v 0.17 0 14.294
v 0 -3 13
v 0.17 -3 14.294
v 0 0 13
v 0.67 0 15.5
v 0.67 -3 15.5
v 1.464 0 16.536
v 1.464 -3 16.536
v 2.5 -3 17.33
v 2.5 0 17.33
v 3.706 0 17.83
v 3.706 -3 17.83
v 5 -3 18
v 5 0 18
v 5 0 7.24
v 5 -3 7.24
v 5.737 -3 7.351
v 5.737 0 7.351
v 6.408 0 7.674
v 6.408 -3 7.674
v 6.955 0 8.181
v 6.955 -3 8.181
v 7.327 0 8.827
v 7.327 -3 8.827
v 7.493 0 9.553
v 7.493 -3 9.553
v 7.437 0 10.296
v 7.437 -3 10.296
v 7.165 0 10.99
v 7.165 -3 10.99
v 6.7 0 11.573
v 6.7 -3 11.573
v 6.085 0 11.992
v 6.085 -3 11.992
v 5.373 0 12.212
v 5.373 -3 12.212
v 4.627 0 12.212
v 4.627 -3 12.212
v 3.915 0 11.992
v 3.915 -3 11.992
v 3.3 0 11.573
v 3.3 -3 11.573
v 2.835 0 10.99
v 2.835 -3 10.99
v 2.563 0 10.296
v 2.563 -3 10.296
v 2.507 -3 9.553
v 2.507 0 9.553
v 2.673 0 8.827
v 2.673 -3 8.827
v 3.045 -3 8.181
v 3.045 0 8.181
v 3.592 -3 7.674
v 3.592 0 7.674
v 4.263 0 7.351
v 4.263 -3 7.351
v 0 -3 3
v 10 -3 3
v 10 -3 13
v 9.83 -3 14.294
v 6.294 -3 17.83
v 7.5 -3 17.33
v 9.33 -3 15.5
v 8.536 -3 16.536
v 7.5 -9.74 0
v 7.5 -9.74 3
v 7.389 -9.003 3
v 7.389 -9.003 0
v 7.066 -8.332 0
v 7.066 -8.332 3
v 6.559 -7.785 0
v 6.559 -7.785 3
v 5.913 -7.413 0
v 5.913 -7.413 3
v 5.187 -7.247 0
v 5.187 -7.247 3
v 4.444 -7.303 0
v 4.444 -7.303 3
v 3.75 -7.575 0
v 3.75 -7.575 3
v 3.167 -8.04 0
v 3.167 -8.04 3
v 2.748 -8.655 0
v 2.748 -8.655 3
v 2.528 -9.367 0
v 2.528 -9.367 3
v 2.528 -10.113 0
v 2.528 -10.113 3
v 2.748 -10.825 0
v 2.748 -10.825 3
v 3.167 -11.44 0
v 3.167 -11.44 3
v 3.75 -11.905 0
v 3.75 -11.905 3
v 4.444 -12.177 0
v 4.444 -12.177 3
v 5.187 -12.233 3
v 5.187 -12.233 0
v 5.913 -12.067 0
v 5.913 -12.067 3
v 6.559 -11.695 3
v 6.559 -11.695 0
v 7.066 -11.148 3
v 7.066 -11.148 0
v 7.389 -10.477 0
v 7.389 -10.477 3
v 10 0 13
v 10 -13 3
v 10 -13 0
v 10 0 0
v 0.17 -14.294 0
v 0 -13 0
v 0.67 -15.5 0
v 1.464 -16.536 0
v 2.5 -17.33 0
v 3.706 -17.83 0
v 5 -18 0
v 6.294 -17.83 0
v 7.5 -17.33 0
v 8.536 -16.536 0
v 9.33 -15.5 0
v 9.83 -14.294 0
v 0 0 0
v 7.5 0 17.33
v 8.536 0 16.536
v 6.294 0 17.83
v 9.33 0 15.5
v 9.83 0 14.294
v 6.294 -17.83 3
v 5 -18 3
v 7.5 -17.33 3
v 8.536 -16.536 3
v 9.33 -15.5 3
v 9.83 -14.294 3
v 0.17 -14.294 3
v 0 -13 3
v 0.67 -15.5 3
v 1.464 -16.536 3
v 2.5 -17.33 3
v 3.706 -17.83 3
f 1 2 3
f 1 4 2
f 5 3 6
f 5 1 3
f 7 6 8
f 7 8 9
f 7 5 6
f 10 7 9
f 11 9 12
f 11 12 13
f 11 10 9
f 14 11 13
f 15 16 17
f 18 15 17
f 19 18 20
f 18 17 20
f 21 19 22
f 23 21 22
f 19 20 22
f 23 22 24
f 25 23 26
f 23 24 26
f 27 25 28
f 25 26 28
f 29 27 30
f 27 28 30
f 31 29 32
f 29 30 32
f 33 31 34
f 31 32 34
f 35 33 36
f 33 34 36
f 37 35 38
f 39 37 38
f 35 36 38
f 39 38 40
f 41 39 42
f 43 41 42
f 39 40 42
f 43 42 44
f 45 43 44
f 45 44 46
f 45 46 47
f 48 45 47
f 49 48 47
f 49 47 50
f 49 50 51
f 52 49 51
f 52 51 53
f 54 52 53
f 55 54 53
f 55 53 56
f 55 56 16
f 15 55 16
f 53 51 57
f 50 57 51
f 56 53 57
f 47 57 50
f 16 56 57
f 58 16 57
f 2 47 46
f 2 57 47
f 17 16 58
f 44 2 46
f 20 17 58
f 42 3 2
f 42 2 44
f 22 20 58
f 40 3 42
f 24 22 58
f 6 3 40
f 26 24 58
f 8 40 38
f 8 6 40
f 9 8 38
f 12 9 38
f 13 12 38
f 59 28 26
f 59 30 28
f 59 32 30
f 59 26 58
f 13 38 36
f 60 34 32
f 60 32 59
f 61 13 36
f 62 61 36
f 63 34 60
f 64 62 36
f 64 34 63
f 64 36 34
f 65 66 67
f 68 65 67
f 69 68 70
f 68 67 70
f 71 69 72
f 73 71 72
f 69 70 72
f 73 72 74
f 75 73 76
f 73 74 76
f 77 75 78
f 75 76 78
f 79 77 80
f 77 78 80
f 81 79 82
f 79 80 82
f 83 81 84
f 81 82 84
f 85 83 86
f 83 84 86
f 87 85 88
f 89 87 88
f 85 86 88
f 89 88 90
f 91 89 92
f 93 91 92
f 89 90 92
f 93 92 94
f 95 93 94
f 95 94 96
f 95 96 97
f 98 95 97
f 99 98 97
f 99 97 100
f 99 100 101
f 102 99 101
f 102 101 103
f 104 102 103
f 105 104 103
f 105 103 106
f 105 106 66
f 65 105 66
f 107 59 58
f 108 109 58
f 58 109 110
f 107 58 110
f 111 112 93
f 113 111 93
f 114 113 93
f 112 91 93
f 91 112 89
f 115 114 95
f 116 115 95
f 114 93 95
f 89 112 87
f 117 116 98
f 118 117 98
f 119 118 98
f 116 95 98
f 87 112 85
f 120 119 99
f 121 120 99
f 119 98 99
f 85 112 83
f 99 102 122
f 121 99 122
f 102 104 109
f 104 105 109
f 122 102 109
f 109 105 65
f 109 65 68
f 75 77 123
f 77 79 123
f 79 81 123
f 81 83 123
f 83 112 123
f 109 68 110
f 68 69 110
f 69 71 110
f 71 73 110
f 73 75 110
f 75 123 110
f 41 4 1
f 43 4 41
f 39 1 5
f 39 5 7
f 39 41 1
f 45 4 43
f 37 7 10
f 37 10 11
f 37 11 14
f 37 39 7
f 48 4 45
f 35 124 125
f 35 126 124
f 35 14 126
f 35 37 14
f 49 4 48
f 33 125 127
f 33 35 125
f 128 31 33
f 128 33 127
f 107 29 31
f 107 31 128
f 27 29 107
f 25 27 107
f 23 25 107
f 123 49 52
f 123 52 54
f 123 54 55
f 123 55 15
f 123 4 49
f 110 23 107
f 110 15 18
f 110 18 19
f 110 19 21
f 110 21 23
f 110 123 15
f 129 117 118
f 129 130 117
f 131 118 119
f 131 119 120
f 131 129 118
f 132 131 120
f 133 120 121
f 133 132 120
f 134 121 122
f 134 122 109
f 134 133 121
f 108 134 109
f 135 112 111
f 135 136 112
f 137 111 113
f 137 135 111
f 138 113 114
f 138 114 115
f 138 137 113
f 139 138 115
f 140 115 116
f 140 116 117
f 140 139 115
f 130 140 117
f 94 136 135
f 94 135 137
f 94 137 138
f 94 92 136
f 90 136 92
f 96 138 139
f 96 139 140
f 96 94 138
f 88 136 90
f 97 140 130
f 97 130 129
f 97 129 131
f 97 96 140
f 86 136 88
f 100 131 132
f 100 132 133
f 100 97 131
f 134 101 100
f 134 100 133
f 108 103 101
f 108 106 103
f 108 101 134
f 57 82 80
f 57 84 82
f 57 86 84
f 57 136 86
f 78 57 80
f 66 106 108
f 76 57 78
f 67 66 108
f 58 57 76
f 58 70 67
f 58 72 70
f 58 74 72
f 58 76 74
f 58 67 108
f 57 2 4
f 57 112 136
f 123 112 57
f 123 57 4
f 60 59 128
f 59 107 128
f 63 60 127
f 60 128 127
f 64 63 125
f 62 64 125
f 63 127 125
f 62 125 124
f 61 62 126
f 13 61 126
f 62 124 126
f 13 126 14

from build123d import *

# Parameters (mm, degrees)
SKETCH_2_W          = 10
SKETCH_2_H          = 18
EXTRUDE_1_DEPTH     = 3
SKETCH_3_R          = 2.5
CUT_EXTRUDE_1_DEPTH = 21.808652047
FILLET_1_R          = 5
SKETCH_4_W          = 10
SKETCH_4_H          = 3
EXTRUDE_2_DEPTH     = 15
FILLET_2_R          = 5
SKETCH_5_R          = 2.5
CUT_EXTRUDE_2_DEPTH = 26.475478406
SKETCH_6_R          = 2.5
EXTRUDE_3_DEPTH     = 3
SKETCH_7_R          = 2.5
CUT_EXTRUDE_3_DEPTH = 26.475478406
SKETCH_8_R          = 2.580933604
EXTRUDE_4_DEPTH     = 3
SKETCH_9_R          = 2.5
CUT_EXTRUDE_4_DEPTH = 26.475478406
SKETCH_10_R         = 2.5
EXTRUDE_5_DEPTH     = 3
SKETCH_11_R         = 2.5
CUT_EXTRUDE_5_DEPTH = 26.475478406


with BuildPart() as part:
    # 草图2 → 凸台-拉伸1 (new body)
    with BuildSketch(Plane.XY):
        with Locations((5, -9)):
            Rectangle(SKETCH_2_W, SKETCH_2_H)
    extrude(amount=EXTRUDE_1_DEPTH)

    # 草图3 → 切除-拉伸1 (cut, through all)
    with BuildSketch(Plane.XY.offset(3)):
        with Locations((5, -9.74)):
            Circle(SKETCH_3_R)
    extrude(amount=-CUT_EXTRUDE_1_DEPTH, mode=Mode.SUBTRACT)

    # 圆角1
    fillet_1_edges = [part.edges().sort_by_distance(p)[0] for p in [
        (10, -18, 1.5),
        (0, -18, 1.5),
    ]]
    fillet(fillet_1_edges, radius=FILLET_1_R - 0.0001)  # a hair under: the kernel refuses the full size

    # 草图4 → 凸台-拉伸2 (add)
    with BuildSketch(Plane.XY.offset(3)):
        with Locations((5, -1.5)):
            Rectangle(SKETCH_4_W, SKETCH_4_H)
    extrude(amount=EXTRUDE_2_DEPTH)

    # 圆角2
    fillet_2_edges = [part.edges().sort_by_distance(p)[0] for p in [
        (10, -1.5, 18),
        (0, -1.5, 18),
    ]]
    fillet(fillet_2_edges, radius=FILLET_2_R - 0.0001)  # a hair under: the kernel refuses the full size

    # 草图5 → 切除-拉伸2 (cut, through all)
    with BuildSketch(Plane.XZ.offset(3)):
        with Locations(Location((5, 11.11, 0), (0, 0, 270))):
            Circle(SKETCH_5_R)
    extrude(amount=-CUT_EXTRUDE_2_DEPTH, mode=Mode.SUBTRACT)

    # 草图6 → 凸台-拉伸3 (add)
    with BuildSketch(Plane.XZ.offset(3)):
        with Locations((5, 11.11)):
            Circle(SKETCH_6_R)
    extrude(amount=-EXTRUDE_3_DEPTH)

    # 草图7 → 切除-拉伸3 (cut, through all)
    with BuildSketch(Plane(origin=(0, -3, 0), x_dir=(-1, 0, 0), z_dir=(0, -1, 0))):
        with Locations(Location((-5, -12.02, 0), (0, 0, 90))):
            Circle(SKETCH_7_R)
    extrude(amount=-CUT_EXTRUDE_3_DEPTH, mode=Mode.SUBTRACT)

    # 草图8 → 凸台-拉伸4 (add)
    with BuildSketch(Plane.XZ.offset(3)):
        with Locations((5, 12.02)):
            Circle(SKETCH_8_R)
    extrude(amount=-EXTRUDE_4_DEPTH)

    # 草图9 → 切除-拉伸4 (cut, through all)
    with BuildSketch(Plane.XZ.offset(3)):
        with Locations(Location((5, 8.11, 0), (0, 0, 270))):
            Circle(SKETCH_9_R)
    extrude(amount=-CUT_EXTRUDE_4_DEPTH, mode=Mode.SUBTRACT)

    # 草图10 → 凸台-拉伸5 (add)
    with BuildSketch(Plane.XZ.offset(3)):
        with Locations((5, 8.11)):
            Circle(SKETCH_10_R)
    extrude(amount=-EXTRUDE_5_DEPTH)

    # 草图11 → 切除-拉伸5 (cut, through all)
    with BuildSketch(Plane.XZ.offset(3)):
        with Locations(Location((5, 9.74, 0), (0, 0, 270))):
            Circle(SKETCH_11_R)
    extrude(amount=-CUT_EXTRUDE_5_DEPTH, mode=Mode.SUBTRACT)


solid = part.part
